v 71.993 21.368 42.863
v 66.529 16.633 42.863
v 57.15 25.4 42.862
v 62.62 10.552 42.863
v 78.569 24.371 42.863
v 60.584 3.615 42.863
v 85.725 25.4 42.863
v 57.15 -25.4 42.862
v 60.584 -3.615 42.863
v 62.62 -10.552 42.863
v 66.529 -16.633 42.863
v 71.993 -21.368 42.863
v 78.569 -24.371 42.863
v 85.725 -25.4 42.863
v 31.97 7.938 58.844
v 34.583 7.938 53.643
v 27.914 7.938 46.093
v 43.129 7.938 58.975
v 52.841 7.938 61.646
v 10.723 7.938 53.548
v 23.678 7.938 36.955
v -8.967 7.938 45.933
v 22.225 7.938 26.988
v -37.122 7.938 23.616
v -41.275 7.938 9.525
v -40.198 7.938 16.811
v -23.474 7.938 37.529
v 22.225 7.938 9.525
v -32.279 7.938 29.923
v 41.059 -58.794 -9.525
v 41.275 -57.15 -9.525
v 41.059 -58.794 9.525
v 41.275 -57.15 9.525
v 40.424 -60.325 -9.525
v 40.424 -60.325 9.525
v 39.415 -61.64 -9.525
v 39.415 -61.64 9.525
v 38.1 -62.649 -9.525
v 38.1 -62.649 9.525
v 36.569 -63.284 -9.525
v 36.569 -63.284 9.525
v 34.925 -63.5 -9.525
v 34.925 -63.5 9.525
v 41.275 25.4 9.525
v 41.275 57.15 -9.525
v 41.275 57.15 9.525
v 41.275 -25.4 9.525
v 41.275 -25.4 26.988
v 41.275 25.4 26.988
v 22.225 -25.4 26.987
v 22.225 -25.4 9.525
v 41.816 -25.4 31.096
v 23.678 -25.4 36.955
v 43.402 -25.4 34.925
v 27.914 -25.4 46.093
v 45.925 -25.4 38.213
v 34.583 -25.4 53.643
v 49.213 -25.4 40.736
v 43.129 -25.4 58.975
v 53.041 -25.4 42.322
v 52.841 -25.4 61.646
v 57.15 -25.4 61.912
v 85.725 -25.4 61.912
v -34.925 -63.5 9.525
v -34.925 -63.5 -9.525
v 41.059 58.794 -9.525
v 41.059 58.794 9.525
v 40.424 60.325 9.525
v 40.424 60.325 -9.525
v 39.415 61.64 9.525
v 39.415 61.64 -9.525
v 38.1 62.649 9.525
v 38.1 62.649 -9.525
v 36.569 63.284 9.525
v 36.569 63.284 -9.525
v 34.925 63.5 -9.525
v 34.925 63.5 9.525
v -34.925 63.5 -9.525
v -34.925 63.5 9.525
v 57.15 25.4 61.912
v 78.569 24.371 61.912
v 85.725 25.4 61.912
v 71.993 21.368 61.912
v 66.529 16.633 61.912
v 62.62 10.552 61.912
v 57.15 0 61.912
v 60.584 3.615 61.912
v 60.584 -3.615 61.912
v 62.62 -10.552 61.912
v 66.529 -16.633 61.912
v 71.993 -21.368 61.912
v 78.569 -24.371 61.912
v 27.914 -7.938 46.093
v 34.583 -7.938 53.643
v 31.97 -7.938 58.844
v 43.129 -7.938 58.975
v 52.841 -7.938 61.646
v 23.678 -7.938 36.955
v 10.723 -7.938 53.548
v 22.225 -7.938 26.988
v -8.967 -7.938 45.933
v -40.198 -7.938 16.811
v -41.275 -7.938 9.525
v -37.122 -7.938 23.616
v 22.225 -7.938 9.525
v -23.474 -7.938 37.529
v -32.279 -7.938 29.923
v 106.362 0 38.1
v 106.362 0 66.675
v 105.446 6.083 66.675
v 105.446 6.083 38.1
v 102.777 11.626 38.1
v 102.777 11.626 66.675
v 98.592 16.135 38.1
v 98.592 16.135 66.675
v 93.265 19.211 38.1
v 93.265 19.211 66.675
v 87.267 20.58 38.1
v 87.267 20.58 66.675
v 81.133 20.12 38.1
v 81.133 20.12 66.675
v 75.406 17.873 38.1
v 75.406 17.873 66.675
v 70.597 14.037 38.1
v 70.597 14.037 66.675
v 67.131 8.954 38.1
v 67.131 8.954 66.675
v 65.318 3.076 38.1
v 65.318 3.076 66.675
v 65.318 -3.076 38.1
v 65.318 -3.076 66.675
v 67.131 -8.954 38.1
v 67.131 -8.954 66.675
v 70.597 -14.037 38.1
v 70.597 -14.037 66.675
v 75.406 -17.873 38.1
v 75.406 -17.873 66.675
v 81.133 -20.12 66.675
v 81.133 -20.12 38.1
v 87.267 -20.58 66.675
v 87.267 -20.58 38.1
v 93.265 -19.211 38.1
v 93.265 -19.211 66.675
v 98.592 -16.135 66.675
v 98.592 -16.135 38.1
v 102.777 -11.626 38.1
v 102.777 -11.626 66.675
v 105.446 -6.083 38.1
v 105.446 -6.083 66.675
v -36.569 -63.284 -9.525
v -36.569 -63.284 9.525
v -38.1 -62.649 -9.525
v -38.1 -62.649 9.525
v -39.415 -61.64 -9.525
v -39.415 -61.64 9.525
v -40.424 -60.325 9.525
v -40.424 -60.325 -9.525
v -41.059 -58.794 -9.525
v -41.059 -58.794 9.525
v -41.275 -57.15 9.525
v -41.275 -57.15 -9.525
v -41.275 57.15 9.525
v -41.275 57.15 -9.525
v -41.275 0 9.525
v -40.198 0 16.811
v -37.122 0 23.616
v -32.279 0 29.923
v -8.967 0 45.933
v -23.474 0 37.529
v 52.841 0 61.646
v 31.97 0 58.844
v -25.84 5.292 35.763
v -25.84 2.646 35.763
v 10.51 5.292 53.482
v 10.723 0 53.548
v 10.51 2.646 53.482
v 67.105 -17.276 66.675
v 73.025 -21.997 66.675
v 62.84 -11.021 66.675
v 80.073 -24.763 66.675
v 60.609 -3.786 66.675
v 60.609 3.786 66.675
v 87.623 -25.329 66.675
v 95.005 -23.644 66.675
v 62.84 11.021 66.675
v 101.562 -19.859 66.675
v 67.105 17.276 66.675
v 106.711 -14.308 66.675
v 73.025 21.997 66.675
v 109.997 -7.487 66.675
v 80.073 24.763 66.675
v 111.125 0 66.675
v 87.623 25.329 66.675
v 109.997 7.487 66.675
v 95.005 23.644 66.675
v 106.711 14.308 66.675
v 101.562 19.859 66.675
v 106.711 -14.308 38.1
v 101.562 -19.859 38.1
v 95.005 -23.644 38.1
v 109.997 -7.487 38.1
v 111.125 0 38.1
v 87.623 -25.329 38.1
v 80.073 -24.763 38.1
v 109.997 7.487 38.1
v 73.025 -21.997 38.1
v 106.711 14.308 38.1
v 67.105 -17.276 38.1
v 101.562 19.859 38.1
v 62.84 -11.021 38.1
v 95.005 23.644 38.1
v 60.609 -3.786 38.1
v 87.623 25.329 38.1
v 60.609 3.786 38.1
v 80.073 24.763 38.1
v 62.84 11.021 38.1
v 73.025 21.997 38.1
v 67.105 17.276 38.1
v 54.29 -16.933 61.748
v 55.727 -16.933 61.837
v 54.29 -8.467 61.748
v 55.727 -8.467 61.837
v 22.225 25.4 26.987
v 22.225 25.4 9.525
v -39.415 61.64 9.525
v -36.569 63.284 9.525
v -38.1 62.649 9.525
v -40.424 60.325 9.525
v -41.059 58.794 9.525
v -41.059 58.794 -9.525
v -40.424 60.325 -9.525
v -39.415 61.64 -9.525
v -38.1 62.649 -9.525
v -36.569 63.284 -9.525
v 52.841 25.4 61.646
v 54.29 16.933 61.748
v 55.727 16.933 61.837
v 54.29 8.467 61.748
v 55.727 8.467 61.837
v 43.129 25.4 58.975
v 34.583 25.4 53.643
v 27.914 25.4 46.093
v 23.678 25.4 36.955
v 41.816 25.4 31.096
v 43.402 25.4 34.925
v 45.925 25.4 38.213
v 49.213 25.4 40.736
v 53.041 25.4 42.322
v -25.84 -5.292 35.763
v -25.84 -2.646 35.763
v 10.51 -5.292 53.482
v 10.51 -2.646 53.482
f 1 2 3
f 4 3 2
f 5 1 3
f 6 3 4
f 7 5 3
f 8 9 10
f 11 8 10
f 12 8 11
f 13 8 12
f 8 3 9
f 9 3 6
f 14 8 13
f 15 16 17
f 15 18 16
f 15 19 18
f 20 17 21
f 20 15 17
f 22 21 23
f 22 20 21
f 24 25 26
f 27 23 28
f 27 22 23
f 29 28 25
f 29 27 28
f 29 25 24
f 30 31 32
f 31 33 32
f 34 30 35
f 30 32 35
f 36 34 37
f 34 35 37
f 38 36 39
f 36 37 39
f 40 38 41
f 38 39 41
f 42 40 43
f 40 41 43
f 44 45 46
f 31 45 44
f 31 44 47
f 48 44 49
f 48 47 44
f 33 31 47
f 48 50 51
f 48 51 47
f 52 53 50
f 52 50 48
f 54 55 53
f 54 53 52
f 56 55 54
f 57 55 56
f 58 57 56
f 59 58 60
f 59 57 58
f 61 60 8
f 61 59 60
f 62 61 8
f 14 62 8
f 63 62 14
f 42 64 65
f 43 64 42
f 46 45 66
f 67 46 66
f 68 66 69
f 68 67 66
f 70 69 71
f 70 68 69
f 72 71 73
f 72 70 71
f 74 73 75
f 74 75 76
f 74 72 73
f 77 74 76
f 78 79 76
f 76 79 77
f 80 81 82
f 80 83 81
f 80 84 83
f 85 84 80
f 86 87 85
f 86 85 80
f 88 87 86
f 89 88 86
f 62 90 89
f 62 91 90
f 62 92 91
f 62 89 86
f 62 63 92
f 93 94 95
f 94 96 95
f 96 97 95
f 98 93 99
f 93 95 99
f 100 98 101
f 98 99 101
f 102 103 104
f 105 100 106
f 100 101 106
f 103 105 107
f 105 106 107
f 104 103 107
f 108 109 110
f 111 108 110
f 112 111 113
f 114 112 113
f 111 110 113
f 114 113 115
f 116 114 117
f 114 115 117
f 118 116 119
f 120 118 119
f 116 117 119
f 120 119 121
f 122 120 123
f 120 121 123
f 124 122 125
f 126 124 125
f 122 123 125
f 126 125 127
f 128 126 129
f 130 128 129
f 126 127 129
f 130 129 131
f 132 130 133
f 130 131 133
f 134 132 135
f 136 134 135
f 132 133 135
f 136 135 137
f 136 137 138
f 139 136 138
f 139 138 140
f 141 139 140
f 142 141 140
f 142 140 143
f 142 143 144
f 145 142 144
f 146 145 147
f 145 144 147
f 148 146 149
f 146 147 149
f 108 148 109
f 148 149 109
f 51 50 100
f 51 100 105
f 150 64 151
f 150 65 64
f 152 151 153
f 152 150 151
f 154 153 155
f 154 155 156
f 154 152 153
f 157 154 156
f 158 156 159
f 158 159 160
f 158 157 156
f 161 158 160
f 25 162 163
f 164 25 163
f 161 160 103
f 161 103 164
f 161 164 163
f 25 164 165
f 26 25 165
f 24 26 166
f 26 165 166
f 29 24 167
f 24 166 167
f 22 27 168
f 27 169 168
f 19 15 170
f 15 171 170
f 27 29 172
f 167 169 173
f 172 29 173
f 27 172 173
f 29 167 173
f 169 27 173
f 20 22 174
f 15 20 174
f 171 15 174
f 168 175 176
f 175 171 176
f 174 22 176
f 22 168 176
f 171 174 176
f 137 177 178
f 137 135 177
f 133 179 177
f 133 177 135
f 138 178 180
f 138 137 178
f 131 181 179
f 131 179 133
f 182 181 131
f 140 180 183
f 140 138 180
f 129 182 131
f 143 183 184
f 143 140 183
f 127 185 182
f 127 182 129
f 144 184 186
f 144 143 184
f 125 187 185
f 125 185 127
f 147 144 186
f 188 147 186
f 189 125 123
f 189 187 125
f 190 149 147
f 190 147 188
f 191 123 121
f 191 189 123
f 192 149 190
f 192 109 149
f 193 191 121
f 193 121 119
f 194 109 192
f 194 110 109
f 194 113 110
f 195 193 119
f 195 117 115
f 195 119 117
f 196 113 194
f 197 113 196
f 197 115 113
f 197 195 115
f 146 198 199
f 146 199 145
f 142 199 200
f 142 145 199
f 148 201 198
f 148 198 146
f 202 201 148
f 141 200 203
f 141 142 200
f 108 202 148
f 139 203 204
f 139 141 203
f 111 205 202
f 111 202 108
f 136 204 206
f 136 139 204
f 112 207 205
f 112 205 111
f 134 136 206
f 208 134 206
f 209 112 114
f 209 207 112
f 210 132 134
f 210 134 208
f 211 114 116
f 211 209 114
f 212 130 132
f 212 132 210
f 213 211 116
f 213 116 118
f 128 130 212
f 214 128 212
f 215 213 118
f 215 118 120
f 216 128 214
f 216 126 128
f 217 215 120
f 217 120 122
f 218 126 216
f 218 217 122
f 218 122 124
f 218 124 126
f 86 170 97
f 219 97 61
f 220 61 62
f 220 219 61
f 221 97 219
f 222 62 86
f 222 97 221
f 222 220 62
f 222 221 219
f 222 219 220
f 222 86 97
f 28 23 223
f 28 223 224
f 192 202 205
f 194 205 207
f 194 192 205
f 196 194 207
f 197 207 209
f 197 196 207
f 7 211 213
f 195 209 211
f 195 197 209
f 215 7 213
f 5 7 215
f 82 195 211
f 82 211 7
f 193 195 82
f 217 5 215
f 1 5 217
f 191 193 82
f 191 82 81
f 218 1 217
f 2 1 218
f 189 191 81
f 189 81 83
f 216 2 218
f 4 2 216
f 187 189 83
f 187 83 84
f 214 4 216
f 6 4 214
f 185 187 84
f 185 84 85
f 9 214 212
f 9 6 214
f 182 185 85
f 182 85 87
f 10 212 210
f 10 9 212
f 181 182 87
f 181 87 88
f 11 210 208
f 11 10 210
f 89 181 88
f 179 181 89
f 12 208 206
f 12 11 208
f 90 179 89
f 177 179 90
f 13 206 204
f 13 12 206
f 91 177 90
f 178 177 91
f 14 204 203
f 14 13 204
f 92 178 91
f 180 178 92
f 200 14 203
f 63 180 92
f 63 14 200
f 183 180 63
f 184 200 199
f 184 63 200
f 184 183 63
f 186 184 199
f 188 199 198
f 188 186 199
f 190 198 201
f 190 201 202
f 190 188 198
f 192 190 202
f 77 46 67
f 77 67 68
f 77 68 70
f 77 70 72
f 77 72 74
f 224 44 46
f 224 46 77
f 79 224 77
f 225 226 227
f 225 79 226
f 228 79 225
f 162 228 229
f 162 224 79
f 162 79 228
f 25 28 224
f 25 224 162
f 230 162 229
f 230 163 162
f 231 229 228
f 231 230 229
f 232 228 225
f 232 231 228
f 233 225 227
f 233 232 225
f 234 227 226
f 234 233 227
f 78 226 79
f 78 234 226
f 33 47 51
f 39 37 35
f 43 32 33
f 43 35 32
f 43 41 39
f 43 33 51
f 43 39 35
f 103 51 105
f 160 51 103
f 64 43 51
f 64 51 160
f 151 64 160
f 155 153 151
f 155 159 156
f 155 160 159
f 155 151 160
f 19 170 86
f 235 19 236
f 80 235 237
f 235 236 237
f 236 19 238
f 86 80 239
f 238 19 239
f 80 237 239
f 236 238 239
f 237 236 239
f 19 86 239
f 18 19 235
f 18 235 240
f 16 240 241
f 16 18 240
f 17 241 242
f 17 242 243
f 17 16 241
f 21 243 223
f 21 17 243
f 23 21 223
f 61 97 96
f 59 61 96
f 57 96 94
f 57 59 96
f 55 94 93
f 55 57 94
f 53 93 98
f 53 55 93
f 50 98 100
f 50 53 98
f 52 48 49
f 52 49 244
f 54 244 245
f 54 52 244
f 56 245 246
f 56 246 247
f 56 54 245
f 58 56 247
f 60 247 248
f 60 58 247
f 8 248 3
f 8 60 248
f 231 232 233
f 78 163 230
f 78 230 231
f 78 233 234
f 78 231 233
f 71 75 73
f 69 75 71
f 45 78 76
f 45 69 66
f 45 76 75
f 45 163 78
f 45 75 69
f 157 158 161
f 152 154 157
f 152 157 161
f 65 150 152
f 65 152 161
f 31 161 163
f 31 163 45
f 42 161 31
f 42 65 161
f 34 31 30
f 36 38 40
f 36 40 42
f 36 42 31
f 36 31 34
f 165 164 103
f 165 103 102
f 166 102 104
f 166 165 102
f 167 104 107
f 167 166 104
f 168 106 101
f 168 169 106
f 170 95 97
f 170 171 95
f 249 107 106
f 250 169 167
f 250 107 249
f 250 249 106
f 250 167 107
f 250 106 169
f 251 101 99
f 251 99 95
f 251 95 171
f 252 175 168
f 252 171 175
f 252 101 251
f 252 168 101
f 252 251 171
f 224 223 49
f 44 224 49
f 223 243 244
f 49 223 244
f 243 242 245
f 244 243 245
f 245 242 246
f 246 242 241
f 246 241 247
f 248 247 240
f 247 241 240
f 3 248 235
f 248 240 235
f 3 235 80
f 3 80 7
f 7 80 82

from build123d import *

# Parameters (mm, degrees)
F1_DEPTH = 63.5
F0_W     = 25.4
F0_H     = 19.05
F2_DEPTH = 25.4
F3_DEPTH = 7.9375
F5_R     = 6.35
F6_R     = 20.6375
F7_DEPTH = 28.575


with BuildPart() as f1:
    # F0 (on Front) → F1 (new body, symmetric)
    with BuildSketch(Plane.XZ):
        Polygon((22.225, 9.525), (-41.275, 9.525), (-41.275, -9.525), (41.275, -9.525), (41.275, 9.525), align=None)
    extrude(amount=F1_DEPTH, both=True)

    # F0 (on Front) → F2 (join, symmetric)
    with BuildSketch(Plane.XZ):
        with BuildLine():
            Line((22.225, 26.9875), (22.225, 9.525))
            Line((22.225, 9.525), (41.275, 9.525))
            Line((41.275, 9.525), (41.275, 26.9875))
            ThreePointArc((41.275, 26.9875), (45.9246798487, 38.2128201513), (57.15, 42.8625))
            Line((57.15, 42.8625), (60.325, 42.8625))
            Line((60.325, 42.8625), (60.325, 61.9125))
            Line((60.325, 61.9125), (57.15, 61.9125))
            add(Edge.make_bspline(
                [(52.8412517036, 61.645692583), (54.2960084782, 61.7553557468), (55.7333080452, 61.8443643855), (57.15, 61.9125)],
                knots=[107.618064177, 107.618064177, 107.618064177, 107.618064177, 111.4985685166, 111.4985685166, 111.4985685166, 111.4985685166], degree=3))
            ThreePointArc((52.8412517036, 61.645692583), (30.9752157673, 50.1097035147), (22.225, 26.9875))
        make_face()
        with Locations((73.025, 52.3875)):
            Rectangle(F0_W, F0_H)
    extrude(amount=F2_DEPTH, both=True)

    # F0 (on Front) → F3 (join, symmetric)
    with BuildSketch(Plane.XZ):
        with BuildLine():
            add(Edge.make_bspline(
                [(-41.275, 9.525), (-41.275, 39.6773087956), (12.4964680785, 58.6044030066), (52.8412517036, 61.645692583)],
                knots=[0, 0, 0, 0, 107.618064177, 107.618064177, 107.618064177, 107.618064177], degree=3))
            Line((-41.275, 9.525), (22.225, 9.525))
            Line((22.225, 9.525), (22.225, 26.9875))
            ThreePointArc((22.225, 26.9875), (30.9752157673, 50.1097035147), (52.8412517036, 61.645692583))
        make_face()
    extrude(amount=F3_DEPTH, both=True)

    # F0 (on Front) → F4 (revolve)
    with BuildSketch(Plane.XZ):
        Polygon((85.725, 66.675), (85.725, 61.9125), (85.725, 42.8625), (85.725, 38.1), (111.125, 38.1), (111.125, 66.675), align=None)
    revolve(axis=Axis((85.725, 0, 52.3875), (0, 0, 1)))

    # F5
    f5_edges = [f1.edges().sort_by_distance(p)[0] for p in [
        (41.275, -63.5, 0),
        (-41.275, -63.5, 0),
        (41.275, 63.5, 0),
        (-41.275, 63.5, 0),
    ]]
    fillet(f5_edges, radius=F5_R)

    # F6 (on face) → F7 (cut, through all)
    with BuildSketch(Plane.XY.offset(66.675)):
        with Locations((85.725, 0)):
            Circle(F6_R)
    extrude(amount=-F7_DEPTH, mode=Mode.SUBTRACT)


solid = f1.part
